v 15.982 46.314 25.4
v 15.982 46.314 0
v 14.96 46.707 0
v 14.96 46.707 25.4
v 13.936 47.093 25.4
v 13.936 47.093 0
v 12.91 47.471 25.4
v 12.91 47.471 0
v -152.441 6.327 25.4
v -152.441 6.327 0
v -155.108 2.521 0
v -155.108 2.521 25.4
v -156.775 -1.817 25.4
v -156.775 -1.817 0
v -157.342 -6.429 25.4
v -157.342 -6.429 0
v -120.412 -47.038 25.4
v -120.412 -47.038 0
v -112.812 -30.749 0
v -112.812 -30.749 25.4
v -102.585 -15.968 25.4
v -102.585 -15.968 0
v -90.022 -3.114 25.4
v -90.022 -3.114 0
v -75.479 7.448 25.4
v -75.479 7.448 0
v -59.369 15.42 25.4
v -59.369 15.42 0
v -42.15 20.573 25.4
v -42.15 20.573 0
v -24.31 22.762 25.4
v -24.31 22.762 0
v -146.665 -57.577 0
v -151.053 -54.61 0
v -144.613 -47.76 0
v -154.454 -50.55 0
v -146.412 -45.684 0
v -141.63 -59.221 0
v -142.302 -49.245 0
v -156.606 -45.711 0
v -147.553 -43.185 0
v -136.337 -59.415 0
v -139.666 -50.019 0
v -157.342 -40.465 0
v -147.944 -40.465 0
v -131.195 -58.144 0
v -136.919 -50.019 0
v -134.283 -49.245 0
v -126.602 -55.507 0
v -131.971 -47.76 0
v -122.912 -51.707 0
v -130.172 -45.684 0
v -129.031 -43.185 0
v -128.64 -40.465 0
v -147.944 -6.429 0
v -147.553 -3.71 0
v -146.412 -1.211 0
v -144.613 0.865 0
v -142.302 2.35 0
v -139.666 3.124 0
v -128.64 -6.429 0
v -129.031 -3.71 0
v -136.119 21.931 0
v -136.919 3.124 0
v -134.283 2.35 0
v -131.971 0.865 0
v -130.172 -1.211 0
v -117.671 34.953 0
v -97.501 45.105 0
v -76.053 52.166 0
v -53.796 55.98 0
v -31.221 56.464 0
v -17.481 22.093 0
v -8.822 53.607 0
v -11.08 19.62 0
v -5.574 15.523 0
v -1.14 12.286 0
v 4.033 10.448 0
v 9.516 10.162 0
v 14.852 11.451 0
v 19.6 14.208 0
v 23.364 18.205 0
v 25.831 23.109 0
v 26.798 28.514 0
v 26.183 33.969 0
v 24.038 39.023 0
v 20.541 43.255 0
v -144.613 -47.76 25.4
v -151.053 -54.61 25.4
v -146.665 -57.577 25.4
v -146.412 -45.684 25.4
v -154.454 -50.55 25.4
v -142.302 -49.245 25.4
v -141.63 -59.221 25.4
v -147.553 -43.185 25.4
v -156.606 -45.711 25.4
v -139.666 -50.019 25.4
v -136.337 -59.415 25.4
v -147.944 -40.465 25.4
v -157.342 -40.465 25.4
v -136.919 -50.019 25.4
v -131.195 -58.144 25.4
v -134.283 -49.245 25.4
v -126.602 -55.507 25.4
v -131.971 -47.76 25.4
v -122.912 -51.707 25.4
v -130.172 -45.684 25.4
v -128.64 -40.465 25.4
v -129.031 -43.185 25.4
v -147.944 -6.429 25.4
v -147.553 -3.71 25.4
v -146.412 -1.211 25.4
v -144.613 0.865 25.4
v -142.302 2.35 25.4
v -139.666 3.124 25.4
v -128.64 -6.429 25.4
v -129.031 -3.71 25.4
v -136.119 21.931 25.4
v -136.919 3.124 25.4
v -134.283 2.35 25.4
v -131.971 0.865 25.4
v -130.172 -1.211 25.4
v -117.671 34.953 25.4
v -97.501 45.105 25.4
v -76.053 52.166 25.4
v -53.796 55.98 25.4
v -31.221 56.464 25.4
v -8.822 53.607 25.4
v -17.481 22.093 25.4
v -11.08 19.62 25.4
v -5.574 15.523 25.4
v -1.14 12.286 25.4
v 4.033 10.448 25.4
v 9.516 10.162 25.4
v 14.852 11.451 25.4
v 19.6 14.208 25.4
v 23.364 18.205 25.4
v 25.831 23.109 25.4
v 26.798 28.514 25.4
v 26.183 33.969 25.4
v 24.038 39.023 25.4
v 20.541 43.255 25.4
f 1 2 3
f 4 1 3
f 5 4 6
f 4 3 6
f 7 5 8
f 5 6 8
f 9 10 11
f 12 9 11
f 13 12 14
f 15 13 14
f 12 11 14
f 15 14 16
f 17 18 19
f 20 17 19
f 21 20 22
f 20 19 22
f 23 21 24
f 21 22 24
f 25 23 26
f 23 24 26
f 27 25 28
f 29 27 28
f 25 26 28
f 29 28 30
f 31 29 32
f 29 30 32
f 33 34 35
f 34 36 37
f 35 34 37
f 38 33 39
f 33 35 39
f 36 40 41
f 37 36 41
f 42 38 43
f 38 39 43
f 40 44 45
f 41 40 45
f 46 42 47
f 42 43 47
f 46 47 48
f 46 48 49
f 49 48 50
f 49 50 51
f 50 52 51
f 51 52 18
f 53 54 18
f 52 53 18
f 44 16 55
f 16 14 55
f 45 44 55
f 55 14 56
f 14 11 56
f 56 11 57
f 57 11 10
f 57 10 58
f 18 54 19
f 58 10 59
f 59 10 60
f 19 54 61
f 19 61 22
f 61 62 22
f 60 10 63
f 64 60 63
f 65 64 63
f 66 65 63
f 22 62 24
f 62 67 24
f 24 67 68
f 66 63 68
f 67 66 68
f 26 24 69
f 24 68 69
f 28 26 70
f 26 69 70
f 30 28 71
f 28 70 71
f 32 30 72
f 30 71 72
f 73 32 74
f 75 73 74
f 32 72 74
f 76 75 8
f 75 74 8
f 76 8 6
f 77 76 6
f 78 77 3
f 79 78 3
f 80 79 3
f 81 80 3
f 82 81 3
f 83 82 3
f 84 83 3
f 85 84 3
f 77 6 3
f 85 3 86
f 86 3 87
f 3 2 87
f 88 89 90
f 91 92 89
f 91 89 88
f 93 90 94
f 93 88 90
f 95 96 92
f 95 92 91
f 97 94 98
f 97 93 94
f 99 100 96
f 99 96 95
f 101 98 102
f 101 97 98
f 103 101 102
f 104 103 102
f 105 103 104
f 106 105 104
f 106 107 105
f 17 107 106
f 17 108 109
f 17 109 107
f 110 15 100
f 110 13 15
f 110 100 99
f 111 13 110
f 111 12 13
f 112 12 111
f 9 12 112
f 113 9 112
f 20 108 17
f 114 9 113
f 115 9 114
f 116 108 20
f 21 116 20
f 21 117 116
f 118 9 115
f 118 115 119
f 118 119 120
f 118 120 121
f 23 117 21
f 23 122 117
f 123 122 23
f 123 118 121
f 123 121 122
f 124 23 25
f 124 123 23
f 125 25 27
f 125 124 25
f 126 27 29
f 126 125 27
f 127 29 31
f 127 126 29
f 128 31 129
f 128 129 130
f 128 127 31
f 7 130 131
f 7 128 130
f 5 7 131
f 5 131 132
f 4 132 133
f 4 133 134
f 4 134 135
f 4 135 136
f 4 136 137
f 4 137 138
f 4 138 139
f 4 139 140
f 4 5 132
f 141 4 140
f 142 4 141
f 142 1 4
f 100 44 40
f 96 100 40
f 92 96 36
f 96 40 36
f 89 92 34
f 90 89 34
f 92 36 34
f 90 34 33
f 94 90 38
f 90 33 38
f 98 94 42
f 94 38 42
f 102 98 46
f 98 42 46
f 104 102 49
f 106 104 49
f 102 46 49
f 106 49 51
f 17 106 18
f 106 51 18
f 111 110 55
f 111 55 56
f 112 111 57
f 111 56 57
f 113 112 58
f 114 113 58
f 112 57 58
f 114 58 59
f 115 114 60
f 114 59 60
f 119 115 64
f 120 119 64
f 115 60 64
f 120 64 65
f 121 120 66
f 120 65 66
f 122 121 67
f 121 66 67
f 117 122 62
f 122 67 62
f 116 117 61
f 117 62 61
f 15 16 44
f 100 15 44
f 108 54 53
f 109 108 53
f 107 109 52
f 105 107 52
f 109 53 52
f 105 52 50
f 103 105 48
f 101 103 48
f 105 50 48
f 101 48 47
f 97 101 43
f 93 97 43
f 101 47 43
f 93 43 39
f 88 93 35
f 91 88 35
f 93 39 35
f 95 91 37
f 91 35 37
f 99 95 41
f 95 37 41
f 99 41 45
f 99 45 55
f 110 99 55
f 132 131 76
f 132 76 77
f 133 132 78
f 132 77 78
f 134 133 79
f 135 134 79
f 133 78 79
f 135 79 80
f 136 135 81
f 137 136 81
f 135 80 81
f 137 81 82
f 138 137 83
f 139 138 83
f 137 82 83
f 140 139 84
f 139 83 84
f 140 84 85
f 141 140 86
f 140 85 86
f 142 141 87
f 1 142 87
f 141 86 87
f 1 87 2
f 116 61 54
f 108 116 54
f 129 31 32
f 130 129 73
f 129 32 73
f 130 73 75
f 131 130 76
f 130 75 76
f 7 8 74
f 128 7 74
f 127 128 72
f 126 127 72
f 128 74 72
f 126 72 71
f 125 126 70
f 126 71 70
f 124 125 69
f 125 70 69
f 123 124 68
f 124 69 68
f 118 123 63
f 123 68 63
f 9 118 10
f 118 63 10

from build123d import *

# Parameters (mm, degrees)
BOSS_EXTRUDE1_DEPTH = 25.4


with BuildPart() as part:
    # Sketch2 → Boss-Extrude1 (new body)
    with BuildSketch(Plane.XY):
        with BuildLine():
            Line((-157.342145667, -6.429422494), (-157.342145667, -40.465422494))
            ThreePointArc((-157.342145667, -40.465422494), (-141.629836885, -59.2207502), (-120.41171865, -47.037547699))
            ThreePointArc((-120.41171865, -47.037547699), (-82.973266833, 2.473921311), (-24.309833539, 22.762460739))
            ThreePointArc((-24.309833539, 22.762460739), (-14.196167577, 21.07351252), (-5.57436841, 15.523434648))
            ThreePointArc((-5.57436841, 15.523434648), (23.363587608, 18.205213028), (15.981707982, 46.314021024))
            ThreePointArc((15.981707982, 46.314021024), (14.448779168, 46.900655432), (12.909621311, 47.470746453))
            ThreePointArc((12.909621311, 47.470746453), (-76.05269782, 52.166250257), (-152.440538162, 6.326967661))
            ThreePointArc((-152.440538162, 6.326967661), (-156.074572062, 0.403425483), (-157.342145667, -6.429422494))
        make_face()
        with BuildLine():
            Line((-147.944145667, -40.465422494), (-147.944145667, -6.429422494))
            ThreePointArc((-147.944145667, -6.429422494), (-138.292145667, 3.222577506), (-128.640145667, -6.429422494))
            Line((-128.640145667, -6.429422494), (-128.640145667, -40.465422494))
            ThreePointArc((-128.640145667, -40.465422494), (-138.292145667, -50.117422494), (-147.944145667, -40.465422494))
        make_face(mode=Mode.SUBTRACT)
    extrude(amount=BOSS_EXTRUDE1_DEPTH)


solid = part.part
